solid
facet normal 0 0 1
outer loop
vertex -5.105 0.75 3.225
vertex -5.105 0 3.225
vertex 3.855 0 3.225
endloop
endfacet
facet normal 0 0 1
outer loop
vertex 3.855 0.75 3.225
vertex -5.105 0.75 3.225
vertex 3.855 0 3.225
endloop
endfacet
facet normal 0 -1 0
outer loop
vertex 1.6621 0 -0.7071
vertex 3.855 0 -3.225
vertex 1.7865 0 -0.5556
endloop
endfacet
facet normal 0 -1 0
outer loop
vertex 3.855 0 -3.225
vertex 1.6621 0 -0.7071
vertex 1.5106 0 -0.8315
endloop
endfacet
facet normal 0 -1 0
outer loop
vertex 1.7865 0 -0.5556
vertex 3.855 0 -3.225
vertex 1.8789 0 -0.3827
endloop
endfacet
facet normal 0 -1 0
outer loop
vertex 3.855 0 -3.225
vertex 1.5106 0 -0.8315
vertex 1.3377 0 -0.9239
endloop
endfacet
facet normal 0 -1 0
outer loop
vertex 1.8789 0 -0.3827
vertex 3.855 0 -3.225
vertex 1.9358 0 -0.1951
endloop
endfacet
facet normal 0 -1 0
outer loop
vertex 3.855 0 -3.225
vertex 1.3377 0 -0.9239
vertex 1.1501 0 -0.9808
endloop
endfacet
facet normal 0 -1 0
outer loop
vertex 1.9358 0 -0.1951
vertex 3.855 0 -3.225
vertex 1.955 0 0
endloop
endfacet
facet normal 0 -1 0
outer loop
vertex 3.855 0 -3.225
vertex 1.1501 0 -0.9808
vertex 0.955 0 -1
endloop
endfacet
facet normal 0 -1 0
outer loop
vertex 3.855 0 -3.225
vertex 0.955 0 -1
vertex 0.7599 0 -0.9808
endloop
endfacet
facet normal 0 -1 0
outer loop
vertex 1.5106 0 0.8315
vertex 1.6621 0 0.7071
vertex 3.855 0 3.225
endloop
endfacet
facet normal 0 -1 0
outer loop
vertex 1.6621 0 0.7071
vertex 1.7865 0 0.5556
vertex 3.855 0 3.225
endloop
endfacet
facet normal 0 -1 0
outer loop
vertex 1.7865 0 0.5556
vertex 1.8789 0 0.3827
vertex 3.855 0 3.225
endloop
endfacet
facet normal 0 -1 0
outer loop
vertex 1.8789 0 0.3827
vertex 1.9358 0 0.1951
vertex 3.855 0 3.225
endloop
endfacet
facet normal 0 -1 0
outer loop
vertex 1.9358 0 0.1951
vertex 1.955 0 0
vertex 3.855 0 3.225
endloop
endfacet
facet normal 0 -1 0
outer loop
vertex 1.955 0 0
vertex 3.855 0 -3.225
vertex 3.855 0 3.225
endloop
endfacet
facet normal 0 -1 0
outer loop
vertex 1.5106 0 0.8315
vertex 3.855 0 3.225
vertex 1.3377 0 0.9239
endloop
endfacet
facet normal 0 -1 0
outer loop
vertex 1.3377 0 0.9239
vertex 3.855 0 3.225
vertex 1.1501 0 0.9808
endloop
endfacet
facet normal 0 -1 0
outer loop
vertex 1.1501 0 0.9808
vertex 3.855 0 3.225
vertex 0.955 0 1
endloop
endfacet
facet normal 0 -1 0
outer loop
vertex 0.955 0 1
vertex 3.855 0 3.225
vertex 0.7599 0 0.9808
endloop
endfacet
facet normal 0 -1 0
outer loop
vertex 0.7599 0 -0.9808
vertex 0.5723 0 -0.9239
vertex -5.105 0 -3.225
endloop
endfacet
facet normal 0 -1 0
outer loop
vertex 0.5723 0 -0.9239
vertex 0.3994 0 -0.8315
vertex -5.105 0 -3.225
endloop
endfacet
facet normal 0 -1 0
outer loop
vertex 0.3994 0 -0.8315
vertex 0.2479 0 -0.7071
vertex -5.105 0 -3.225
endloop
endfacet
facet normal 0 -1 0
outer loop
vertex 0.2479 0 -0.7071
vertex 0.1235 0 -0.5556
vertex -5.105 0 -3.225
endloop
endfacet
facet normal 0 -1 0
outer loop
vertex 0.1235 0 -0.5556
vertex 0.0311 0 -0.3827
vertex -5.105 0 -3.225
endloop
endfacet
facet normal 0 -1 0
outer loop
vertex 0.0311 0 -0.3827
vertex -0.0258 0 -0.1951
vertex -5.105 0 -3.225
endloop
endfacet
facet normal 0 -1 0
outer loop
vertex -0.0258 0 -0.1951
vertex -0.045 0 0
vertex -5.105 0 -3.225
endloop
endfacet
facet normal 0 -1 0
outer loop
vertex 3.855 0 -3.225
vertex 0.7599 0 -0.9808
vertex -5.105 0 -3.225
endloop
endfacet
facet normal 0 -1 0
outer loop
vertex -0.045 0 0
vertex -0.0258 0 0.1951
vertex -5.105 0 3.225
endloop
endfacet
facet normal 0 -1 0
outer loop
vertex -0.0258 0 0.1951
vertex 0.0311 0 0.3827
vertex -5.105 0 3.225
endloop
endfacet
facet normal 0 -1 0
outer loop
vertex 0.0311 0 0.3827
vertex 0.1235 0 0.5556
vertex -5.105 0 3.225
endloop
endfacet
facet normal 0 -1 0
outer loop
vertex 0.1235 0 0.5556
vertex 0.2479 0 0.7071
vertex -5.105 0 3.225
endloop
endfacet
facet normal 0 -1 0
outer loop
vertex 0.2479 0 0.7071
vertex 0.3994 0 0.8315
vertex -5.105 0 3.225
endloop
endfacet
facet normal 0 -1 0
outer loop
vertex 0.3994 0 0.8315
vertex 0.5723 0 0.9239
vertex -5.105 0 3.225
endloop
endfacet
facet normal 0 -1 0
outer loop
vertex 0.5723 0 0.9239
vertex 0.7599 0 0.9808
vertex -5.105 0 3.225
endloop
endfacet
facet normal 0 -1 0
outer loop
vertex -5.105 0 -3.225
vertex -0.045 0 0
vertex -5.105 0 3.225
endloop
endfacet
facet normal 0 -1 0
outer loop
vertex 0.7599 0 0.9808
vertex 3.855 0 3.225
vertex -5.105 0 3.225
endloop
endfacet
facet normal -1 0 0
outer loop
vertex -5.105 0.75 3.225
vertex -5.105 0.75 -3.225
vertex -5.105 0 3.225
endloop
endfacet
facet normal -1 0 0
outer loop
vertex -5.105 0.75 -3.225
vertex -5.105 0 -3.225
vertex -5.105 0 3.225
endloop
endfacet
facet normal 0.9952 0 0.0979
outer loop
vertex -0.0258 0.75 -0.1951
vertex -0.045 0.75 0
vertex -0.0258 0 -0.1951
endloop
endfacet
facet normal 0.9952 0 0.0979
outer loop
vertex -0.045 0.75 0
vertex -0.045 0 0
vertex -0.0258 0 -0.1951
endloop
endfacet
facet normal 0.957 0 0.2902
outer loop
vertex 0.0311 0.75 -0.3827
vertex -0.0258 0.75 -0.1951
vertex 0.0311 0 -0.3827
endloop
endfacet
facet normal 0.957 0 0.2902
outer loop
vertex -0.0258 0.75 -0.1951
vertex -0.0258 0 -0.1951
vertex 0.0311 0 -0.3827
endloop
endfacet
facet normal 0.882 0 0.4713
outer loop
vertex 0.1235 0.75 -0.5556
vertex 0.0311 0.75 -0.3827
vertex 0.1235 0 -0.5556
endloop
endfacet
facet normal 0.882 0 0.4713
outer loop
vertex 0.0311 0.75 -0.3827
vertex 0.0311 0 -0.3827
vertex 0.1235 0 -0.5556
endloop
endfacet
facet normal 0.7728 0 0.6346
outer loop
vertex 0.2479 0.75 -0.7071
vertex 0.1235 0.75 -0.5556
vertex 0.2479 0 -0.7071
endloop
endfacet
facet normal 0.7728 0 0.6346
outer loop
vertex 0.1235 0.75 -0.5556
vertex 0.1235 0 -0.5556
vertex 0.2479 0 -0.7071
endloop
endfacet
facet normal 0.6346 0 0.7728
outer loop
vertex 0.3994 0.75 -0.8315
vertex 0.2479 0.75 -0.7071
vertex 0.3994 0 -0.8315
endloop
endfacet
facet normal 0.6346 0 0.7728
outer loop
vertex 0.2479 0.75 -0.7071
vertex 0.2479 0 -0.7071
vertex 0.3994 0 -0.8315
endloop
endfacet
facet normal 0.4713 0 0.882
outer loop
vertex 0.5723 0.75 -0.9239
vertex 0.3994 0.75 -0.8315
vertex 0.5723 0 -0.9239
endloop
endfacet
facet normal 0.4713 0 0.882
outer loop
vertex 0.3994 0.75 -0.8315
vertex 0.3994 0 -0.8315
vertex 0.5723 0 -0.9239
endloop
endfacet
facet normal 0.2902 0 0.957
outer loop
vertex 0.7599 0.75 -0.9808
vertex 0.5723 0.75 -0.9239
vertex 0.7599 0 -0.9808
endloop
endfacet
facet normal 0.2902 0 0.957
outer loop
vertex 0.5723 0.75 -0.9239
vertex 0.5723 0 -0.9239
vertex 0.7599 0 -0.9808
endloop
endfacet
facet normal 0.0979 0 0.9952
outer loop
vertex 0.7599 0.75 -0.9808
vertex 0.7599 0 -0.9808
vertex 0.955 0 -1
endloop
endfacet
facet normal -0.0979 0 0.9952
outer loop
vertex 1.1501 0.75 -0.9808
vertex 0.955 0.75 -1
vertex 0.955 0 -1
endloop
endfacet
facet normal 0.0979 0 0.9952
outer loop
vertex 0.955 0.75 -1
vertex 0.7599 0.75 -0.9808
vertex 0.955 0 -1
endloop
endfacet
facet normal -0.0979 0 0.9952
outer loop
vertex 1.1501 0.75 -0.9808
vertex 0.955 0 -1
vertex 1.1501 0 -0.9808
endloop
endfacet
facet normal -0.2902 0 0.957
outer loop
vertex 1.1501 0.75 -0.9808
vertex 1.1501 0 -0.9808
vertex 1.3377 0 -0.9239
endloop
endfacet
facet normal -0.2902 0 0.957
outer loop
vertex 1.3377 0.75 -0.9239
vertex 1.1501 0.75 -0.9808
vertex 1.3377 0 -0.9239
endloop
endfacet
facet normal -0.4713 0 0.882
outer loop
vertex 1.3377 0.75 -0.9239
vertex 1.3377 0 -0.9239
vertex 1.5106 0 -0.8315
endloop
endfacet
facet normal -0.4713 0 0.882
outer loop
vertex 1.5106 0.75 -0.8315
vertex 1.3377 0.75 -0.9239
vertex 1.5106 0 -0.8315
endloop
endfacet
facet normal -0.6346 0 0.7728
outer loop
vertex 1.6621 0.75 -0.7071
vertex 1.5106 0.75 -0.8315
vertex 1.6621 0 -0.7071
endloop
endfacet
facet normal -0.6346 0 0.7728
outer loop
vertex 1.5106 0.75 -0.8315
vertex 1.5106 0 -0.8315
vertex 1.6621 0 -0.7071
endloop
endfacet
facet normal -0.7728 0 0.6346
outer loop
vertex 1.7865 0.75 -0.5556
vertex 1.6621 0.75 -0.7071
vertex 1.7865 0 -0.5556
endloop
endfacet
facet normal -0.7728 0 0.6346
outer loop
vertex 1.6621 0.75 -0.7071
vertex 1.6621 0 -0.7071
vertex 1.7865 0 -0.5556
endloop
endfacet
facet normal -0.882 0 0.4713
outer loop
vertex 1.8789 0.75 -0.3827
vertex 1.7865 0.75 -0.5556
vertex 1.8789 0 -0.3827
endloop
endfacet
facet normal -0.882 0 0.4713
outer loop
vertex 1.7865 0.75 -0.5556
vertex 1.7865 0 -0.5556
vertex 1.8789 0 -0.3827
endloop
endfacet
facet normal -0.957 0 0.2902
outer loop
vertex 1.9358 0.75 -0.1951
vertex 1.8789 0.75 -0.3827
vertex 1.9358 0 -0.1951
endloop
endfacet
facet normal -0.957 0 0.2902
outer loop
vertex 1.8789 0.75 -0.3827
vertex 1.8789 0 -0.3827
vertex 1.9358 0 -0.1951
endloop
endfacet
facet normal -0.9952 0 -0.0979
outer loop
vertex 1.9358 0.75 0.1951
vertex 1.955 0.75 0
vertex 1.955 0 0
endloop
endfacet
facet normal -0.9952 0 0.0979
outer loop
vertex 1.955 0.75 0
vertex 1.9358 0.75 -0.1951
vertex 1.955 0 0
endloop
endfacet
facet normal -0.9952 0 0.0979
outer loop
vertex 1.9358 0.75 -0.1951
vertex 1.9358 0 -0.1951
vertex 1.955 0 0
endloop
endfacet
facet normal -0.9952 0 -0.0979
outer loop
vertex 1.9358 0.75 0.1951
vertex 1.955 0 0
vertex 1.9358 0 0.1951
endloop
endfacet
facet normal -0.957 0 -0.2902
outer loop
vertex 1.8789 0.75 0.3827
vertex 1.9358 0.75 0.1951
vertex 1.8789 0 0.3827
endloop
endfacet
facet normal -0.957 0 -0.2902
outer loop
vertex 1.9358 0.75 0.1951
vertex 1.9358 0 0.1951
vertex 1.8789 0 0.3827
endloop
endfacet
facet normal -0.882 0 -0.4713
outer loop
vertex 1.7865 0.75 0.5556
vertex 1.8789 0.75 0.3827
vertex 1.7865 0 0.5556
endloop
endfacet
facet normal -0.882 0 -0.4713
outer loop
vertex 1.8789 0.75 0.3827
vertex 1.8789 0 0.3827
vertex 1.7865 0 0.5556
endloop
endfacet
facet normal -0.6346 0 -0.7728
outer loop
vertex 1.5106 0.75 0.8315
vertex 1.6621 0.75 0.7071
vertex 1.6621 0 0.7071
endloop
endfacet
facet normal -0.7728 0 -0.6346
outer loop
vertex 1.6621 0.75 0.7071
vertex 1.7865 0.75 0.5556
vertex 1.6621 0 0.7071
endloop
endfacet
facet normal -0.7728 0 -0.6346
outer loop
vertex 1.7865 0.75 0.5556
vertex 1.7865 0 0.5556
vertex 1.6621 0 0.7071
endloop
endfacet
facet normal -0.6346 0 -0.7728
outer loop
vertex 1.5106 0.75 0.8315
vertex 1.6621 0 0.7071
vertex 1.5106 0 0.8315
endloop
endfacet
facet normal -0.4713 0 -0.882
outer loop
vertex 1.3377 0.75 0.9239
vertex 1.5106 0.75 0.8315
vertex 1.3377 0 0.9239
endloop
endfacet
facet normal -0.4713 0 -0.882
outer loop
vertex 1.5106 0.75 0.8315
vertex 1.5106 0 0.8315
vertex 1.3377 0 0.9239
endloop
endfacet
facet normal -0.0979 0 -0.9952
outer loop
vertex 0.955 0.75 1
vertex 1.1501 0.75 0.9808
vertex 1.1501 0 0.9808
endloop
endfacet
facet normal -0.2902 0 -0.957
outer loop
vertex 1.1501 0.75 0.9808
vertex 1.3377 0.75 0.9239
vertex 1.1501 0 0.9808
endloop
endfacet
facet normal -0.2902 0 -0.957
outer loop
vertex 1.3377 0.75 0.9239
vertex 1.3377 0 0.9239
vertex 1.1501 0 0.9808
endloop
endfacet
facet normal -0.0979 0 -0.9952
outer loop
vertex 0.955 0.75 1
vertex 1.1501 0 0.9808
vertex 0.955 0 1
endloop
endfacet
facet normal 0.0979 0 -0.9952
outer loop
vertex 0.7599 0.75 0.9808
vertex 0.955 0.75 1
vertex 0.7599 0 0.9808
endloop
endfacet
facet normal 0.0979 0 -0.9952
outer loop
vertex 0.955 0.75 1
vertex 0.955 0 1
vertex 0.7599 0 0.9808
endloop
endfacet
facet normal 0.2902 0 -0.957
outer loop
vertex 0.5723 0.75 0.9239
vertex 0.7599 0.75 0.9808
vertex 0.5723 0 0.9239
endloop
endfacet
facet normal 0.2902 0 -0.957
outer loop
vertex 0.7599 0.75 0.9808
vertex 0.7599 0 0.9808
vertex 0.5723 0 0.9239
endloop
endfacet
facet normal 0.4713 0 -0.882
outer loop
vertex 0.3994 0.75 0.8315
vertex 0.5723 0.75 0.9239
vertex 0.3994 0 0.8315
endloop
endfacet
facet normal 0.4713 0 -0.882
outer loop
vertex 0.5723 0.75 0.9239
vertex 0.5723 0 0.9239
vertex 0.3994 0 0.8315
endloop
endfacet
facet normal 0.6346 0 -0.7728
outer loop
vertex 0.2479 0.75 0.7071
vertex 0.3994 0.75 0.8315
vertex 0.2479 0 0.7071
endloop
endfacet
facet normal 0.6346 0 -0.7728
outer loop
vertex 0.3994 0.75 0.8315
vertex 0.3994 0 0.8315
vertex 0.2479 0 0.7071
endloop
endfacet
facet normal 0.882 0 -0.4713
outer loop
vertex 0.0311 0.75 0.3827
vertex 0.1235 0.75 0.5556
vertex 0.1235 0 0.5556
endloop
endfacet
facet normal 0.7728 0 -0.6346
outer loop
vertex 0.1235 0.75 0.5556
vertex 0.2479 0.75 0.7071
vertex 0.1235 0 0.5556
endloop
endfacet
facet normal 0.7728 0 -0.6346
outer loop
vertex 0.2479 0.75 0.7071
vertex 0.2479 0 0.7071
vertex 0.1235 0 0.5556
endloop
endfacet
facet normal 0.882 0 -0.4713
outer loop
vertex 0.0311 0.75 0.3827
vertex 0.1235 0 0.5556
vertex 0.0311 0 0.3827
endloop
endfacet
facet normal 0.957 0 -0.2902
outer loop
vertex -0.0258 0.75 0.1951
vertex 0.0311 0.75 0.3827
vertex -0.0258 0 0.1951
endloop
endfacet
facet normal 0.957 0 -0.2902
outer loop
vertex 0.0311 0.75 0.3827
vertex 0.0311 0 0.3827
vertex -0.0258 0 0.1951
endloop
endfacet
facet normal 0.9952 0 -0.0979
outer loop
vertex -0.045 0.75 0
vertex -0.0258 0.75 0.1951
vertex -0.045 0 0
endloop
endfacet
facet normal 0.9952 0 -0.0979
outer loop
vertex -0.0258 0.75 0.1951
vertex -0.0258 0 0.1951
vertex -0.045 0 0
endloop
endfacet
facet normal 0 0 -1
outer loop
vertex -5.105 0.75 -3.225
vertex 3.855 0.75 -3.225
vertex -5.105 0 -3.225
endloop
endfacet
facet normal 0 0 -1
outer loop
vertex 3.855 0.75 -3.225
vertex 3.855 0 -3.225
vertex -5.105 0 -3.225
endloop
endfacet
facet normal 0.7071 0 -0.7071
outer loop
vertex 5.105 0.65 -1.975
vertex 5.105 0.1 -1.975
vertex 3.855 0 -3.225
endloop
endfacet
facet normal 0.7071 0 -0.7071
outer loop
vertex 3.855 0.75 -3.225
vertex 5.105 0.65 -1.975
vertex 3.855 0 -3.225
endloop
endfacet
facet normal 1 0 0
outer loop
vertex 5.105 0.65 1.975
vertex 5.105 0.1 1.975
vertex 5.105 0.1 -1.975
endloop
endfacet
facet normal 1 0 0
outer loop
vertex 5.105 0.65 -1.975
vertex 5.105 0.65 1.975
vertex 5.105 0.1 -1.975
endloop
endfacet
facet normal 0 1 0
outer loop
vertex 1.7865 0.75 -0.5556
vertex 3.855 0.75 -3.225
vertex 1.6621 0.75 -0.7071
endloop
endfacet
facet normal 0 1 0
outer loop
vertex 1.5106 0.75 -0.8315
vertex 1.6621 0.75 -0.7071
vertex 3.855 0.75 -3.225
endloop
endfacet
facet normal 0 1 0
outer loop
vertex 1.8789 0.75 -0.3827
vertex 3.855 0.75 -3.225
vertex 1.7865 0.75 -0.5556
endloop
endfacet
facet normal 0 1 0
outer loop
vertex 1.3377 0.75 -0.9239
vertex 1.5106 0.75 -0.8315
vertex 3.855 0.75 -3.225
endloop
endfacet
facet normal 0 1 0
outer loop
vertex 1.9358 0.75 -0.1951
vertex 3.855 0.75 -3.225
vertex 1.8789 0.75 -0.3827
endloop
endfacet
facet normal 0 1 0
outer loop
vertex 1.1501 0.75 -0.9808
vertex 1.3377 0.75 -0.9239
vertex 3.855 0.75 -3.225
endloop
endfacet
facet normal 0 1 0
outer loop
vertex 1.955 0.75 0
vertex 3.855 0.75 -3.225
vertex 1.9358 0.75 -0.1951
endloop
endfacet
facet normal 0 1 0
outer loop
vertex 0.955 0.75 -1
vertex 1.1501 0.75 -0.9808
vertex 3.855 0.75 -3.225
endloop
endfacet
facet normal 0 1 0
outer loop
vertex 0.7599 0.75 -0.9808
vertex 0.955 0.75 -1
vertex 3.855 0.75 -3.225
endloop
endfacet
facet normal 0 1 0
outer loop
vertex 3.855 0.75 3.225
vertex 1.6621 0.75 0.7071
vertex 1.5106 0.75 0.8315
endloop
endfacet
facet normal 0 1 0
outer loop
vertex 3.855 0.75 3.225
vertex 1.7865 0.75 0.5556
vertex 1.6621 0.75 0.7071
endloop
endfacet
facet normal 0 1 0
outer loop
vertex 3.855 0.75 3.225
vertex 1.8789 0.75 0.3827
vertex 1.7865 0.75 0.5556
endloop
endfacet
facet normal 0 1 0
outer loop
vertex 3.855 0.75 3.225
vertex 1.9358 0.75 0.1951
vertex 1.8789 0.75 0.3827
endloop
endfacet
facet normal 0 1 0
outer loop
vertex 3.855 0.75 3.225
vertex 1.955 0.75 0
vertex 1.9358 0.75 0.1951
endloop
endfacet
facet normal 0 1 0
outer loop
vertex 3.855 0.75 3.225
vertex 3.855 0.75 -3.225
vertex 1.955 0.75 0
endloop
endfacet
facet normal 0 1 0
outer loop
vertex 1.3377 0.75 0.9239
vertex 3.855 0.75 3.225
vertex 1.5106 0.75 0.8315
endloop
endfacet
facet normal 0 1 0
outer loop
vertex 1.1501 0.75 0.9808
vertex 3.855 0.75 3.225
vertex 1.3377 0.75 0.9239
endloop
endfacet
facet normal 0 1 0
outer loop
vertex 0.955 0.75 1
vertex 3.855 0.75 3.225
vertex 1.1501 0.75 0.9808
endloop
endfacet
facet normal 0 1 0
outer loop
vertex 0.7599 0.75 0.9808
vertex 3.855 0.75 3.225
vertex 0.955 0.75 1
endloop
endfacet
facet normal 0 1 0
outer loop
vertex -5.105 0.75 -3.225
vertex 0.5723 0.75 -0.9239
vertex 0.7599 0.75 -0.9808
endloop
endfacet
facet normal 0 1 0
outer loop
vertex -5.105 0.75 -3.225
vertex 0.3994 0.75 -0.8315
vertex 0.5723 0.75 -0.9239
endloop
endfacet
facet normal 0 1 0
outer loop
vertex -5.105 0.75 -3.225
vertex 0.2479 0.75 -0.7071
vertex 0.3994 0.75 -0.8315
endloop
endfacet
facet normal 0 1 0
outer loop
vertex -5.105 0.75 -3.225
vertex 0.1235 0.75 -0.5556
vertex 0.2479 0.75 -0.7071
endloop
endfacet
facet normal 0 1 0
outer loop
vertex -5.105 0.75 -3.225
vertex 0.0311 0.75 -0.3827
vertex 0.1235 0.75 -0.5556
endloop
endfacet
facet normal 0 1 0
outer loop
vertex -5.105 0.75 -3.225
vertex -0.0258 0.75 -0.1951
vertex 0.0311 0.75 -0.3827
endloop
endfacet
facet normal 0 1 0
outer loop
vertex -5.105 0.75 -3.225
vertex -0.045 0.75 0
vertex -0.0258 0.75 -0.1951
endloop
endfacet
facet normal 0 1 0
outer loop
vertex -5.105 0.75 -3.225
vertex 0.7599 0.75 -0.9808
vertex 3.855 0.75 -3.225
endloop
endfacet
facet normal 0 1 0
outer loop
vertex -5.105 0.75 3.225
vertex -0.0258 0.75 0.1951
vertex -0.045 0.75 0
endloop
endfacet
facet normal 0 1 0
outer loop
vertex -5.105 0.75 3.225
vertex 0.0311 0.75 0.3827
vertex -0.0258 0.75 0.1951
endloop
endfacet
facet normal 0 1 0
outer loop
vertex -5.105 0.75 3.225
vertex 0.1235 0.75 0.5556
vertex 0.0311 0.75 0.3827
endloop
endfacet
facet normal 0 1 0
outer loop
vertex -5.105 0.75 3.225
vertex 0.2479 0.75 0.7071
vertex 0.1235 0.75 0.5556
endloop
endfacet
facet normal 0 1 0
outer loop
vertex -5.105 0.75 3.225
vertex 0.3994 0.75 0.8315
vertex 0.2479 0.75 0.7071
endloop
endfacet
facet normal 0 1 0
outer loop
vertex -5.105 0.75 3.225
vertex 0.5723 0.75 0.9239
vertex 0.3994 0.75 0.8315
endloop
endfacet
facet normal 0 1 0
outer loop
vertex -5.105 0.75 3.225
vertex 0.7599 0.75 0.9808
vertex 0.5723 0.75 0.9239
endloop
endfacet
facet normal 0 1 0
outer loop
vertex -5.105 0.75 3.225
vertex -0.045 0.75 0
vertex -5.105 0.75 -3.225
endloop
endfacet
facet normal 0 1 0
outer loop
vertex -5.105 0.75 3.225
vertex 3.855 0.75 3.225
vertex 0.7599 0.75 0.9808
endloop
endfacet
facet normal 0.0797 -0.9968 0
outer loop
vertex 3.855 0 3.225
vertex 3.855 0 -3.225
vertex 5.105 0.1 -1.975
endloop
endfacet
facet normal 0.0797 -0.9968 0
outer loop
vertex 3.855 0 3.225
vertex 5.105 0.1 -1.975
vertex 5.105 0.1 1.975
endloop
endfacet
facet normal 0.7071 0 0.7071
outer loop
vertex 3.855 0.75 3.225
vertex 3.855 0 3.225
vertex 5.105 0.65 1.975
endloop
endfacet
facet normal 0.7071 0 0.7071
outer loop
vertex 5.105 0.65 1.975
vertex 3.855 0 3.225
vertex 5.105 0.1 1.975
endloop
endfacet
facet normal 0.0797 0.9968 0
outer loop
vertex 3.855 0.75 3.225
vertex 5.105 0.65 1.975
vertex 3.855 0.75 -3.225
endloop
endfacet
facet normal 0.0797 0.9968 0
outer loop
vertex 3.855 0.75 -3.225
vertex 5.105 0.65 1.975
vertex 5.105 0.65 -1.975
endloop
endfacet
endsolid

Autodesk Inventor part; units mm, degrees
ref_plane "YZ Plane" through (0, 0, 0) normal (1, 0, 0) x (0, 1, 0)
ref_plane "XZ Plane" through (0, 0, 0) normal (0, 1, 0) x (-1, 0, 0)
ref_plane "XY Plane" through (0, 0, 0) normal (0, 0, 1) x (1, 0, 0)
sketch "Sketch1" plane through (0, 0, 0) normal (0, 1, 0) x (-1, 0, 0)
  line L0 (5.105, 3.225) -> (-3.855, 3.225)
  line L1 (-5.105, 1.975) -> (-5.105, -1.975)
  line L2 (-3.855, -3.225) -> (5.105, -3.225)
  line L3 (5.105, -3.225) -> (5.105, 3.225)
  line L4 (5.105, 0) -> (-5.105, 0) construction
  line L5 (-3.855, 3.225) -> (-5.105, 1.975)
  line L6 (-5.105, -1.975) -> (-3.855, -3.225)
  line L7 (-4.48, 2.6) -> (-1.88, 0) construction
  line L8 (-4.48, -2.6) -> (-1.88, 0) construction
  circle A0 centre (-0.955, 0) radius 1
  point P0 (0, 0)
  point P1 (0, 0)
  dimension "d0" = 6.45
  dimension "d1" = 10.21
  dimension "d2" = 1.25
  dimension "d3" = 2
  dimension "d4" = 3.15
extrude "Extrusion1" add sketch "Sketch1" along normal blind 0.75
chamfer "Chamfer1" distance 1.25 distance2 0.1 1 edges at (5.105, 0.75, 0) measured on face at (-3.4183, 0.75, 0)
chamfer "Chamfer2" distance 0.1 distance2 1.25 1 edges at (5.105, 0, 0) measured on face at (5.105, 0.2167, 0.6583)
properties part number "Toggle_Pin_Brass" material "Brass, Soft Yellow"
